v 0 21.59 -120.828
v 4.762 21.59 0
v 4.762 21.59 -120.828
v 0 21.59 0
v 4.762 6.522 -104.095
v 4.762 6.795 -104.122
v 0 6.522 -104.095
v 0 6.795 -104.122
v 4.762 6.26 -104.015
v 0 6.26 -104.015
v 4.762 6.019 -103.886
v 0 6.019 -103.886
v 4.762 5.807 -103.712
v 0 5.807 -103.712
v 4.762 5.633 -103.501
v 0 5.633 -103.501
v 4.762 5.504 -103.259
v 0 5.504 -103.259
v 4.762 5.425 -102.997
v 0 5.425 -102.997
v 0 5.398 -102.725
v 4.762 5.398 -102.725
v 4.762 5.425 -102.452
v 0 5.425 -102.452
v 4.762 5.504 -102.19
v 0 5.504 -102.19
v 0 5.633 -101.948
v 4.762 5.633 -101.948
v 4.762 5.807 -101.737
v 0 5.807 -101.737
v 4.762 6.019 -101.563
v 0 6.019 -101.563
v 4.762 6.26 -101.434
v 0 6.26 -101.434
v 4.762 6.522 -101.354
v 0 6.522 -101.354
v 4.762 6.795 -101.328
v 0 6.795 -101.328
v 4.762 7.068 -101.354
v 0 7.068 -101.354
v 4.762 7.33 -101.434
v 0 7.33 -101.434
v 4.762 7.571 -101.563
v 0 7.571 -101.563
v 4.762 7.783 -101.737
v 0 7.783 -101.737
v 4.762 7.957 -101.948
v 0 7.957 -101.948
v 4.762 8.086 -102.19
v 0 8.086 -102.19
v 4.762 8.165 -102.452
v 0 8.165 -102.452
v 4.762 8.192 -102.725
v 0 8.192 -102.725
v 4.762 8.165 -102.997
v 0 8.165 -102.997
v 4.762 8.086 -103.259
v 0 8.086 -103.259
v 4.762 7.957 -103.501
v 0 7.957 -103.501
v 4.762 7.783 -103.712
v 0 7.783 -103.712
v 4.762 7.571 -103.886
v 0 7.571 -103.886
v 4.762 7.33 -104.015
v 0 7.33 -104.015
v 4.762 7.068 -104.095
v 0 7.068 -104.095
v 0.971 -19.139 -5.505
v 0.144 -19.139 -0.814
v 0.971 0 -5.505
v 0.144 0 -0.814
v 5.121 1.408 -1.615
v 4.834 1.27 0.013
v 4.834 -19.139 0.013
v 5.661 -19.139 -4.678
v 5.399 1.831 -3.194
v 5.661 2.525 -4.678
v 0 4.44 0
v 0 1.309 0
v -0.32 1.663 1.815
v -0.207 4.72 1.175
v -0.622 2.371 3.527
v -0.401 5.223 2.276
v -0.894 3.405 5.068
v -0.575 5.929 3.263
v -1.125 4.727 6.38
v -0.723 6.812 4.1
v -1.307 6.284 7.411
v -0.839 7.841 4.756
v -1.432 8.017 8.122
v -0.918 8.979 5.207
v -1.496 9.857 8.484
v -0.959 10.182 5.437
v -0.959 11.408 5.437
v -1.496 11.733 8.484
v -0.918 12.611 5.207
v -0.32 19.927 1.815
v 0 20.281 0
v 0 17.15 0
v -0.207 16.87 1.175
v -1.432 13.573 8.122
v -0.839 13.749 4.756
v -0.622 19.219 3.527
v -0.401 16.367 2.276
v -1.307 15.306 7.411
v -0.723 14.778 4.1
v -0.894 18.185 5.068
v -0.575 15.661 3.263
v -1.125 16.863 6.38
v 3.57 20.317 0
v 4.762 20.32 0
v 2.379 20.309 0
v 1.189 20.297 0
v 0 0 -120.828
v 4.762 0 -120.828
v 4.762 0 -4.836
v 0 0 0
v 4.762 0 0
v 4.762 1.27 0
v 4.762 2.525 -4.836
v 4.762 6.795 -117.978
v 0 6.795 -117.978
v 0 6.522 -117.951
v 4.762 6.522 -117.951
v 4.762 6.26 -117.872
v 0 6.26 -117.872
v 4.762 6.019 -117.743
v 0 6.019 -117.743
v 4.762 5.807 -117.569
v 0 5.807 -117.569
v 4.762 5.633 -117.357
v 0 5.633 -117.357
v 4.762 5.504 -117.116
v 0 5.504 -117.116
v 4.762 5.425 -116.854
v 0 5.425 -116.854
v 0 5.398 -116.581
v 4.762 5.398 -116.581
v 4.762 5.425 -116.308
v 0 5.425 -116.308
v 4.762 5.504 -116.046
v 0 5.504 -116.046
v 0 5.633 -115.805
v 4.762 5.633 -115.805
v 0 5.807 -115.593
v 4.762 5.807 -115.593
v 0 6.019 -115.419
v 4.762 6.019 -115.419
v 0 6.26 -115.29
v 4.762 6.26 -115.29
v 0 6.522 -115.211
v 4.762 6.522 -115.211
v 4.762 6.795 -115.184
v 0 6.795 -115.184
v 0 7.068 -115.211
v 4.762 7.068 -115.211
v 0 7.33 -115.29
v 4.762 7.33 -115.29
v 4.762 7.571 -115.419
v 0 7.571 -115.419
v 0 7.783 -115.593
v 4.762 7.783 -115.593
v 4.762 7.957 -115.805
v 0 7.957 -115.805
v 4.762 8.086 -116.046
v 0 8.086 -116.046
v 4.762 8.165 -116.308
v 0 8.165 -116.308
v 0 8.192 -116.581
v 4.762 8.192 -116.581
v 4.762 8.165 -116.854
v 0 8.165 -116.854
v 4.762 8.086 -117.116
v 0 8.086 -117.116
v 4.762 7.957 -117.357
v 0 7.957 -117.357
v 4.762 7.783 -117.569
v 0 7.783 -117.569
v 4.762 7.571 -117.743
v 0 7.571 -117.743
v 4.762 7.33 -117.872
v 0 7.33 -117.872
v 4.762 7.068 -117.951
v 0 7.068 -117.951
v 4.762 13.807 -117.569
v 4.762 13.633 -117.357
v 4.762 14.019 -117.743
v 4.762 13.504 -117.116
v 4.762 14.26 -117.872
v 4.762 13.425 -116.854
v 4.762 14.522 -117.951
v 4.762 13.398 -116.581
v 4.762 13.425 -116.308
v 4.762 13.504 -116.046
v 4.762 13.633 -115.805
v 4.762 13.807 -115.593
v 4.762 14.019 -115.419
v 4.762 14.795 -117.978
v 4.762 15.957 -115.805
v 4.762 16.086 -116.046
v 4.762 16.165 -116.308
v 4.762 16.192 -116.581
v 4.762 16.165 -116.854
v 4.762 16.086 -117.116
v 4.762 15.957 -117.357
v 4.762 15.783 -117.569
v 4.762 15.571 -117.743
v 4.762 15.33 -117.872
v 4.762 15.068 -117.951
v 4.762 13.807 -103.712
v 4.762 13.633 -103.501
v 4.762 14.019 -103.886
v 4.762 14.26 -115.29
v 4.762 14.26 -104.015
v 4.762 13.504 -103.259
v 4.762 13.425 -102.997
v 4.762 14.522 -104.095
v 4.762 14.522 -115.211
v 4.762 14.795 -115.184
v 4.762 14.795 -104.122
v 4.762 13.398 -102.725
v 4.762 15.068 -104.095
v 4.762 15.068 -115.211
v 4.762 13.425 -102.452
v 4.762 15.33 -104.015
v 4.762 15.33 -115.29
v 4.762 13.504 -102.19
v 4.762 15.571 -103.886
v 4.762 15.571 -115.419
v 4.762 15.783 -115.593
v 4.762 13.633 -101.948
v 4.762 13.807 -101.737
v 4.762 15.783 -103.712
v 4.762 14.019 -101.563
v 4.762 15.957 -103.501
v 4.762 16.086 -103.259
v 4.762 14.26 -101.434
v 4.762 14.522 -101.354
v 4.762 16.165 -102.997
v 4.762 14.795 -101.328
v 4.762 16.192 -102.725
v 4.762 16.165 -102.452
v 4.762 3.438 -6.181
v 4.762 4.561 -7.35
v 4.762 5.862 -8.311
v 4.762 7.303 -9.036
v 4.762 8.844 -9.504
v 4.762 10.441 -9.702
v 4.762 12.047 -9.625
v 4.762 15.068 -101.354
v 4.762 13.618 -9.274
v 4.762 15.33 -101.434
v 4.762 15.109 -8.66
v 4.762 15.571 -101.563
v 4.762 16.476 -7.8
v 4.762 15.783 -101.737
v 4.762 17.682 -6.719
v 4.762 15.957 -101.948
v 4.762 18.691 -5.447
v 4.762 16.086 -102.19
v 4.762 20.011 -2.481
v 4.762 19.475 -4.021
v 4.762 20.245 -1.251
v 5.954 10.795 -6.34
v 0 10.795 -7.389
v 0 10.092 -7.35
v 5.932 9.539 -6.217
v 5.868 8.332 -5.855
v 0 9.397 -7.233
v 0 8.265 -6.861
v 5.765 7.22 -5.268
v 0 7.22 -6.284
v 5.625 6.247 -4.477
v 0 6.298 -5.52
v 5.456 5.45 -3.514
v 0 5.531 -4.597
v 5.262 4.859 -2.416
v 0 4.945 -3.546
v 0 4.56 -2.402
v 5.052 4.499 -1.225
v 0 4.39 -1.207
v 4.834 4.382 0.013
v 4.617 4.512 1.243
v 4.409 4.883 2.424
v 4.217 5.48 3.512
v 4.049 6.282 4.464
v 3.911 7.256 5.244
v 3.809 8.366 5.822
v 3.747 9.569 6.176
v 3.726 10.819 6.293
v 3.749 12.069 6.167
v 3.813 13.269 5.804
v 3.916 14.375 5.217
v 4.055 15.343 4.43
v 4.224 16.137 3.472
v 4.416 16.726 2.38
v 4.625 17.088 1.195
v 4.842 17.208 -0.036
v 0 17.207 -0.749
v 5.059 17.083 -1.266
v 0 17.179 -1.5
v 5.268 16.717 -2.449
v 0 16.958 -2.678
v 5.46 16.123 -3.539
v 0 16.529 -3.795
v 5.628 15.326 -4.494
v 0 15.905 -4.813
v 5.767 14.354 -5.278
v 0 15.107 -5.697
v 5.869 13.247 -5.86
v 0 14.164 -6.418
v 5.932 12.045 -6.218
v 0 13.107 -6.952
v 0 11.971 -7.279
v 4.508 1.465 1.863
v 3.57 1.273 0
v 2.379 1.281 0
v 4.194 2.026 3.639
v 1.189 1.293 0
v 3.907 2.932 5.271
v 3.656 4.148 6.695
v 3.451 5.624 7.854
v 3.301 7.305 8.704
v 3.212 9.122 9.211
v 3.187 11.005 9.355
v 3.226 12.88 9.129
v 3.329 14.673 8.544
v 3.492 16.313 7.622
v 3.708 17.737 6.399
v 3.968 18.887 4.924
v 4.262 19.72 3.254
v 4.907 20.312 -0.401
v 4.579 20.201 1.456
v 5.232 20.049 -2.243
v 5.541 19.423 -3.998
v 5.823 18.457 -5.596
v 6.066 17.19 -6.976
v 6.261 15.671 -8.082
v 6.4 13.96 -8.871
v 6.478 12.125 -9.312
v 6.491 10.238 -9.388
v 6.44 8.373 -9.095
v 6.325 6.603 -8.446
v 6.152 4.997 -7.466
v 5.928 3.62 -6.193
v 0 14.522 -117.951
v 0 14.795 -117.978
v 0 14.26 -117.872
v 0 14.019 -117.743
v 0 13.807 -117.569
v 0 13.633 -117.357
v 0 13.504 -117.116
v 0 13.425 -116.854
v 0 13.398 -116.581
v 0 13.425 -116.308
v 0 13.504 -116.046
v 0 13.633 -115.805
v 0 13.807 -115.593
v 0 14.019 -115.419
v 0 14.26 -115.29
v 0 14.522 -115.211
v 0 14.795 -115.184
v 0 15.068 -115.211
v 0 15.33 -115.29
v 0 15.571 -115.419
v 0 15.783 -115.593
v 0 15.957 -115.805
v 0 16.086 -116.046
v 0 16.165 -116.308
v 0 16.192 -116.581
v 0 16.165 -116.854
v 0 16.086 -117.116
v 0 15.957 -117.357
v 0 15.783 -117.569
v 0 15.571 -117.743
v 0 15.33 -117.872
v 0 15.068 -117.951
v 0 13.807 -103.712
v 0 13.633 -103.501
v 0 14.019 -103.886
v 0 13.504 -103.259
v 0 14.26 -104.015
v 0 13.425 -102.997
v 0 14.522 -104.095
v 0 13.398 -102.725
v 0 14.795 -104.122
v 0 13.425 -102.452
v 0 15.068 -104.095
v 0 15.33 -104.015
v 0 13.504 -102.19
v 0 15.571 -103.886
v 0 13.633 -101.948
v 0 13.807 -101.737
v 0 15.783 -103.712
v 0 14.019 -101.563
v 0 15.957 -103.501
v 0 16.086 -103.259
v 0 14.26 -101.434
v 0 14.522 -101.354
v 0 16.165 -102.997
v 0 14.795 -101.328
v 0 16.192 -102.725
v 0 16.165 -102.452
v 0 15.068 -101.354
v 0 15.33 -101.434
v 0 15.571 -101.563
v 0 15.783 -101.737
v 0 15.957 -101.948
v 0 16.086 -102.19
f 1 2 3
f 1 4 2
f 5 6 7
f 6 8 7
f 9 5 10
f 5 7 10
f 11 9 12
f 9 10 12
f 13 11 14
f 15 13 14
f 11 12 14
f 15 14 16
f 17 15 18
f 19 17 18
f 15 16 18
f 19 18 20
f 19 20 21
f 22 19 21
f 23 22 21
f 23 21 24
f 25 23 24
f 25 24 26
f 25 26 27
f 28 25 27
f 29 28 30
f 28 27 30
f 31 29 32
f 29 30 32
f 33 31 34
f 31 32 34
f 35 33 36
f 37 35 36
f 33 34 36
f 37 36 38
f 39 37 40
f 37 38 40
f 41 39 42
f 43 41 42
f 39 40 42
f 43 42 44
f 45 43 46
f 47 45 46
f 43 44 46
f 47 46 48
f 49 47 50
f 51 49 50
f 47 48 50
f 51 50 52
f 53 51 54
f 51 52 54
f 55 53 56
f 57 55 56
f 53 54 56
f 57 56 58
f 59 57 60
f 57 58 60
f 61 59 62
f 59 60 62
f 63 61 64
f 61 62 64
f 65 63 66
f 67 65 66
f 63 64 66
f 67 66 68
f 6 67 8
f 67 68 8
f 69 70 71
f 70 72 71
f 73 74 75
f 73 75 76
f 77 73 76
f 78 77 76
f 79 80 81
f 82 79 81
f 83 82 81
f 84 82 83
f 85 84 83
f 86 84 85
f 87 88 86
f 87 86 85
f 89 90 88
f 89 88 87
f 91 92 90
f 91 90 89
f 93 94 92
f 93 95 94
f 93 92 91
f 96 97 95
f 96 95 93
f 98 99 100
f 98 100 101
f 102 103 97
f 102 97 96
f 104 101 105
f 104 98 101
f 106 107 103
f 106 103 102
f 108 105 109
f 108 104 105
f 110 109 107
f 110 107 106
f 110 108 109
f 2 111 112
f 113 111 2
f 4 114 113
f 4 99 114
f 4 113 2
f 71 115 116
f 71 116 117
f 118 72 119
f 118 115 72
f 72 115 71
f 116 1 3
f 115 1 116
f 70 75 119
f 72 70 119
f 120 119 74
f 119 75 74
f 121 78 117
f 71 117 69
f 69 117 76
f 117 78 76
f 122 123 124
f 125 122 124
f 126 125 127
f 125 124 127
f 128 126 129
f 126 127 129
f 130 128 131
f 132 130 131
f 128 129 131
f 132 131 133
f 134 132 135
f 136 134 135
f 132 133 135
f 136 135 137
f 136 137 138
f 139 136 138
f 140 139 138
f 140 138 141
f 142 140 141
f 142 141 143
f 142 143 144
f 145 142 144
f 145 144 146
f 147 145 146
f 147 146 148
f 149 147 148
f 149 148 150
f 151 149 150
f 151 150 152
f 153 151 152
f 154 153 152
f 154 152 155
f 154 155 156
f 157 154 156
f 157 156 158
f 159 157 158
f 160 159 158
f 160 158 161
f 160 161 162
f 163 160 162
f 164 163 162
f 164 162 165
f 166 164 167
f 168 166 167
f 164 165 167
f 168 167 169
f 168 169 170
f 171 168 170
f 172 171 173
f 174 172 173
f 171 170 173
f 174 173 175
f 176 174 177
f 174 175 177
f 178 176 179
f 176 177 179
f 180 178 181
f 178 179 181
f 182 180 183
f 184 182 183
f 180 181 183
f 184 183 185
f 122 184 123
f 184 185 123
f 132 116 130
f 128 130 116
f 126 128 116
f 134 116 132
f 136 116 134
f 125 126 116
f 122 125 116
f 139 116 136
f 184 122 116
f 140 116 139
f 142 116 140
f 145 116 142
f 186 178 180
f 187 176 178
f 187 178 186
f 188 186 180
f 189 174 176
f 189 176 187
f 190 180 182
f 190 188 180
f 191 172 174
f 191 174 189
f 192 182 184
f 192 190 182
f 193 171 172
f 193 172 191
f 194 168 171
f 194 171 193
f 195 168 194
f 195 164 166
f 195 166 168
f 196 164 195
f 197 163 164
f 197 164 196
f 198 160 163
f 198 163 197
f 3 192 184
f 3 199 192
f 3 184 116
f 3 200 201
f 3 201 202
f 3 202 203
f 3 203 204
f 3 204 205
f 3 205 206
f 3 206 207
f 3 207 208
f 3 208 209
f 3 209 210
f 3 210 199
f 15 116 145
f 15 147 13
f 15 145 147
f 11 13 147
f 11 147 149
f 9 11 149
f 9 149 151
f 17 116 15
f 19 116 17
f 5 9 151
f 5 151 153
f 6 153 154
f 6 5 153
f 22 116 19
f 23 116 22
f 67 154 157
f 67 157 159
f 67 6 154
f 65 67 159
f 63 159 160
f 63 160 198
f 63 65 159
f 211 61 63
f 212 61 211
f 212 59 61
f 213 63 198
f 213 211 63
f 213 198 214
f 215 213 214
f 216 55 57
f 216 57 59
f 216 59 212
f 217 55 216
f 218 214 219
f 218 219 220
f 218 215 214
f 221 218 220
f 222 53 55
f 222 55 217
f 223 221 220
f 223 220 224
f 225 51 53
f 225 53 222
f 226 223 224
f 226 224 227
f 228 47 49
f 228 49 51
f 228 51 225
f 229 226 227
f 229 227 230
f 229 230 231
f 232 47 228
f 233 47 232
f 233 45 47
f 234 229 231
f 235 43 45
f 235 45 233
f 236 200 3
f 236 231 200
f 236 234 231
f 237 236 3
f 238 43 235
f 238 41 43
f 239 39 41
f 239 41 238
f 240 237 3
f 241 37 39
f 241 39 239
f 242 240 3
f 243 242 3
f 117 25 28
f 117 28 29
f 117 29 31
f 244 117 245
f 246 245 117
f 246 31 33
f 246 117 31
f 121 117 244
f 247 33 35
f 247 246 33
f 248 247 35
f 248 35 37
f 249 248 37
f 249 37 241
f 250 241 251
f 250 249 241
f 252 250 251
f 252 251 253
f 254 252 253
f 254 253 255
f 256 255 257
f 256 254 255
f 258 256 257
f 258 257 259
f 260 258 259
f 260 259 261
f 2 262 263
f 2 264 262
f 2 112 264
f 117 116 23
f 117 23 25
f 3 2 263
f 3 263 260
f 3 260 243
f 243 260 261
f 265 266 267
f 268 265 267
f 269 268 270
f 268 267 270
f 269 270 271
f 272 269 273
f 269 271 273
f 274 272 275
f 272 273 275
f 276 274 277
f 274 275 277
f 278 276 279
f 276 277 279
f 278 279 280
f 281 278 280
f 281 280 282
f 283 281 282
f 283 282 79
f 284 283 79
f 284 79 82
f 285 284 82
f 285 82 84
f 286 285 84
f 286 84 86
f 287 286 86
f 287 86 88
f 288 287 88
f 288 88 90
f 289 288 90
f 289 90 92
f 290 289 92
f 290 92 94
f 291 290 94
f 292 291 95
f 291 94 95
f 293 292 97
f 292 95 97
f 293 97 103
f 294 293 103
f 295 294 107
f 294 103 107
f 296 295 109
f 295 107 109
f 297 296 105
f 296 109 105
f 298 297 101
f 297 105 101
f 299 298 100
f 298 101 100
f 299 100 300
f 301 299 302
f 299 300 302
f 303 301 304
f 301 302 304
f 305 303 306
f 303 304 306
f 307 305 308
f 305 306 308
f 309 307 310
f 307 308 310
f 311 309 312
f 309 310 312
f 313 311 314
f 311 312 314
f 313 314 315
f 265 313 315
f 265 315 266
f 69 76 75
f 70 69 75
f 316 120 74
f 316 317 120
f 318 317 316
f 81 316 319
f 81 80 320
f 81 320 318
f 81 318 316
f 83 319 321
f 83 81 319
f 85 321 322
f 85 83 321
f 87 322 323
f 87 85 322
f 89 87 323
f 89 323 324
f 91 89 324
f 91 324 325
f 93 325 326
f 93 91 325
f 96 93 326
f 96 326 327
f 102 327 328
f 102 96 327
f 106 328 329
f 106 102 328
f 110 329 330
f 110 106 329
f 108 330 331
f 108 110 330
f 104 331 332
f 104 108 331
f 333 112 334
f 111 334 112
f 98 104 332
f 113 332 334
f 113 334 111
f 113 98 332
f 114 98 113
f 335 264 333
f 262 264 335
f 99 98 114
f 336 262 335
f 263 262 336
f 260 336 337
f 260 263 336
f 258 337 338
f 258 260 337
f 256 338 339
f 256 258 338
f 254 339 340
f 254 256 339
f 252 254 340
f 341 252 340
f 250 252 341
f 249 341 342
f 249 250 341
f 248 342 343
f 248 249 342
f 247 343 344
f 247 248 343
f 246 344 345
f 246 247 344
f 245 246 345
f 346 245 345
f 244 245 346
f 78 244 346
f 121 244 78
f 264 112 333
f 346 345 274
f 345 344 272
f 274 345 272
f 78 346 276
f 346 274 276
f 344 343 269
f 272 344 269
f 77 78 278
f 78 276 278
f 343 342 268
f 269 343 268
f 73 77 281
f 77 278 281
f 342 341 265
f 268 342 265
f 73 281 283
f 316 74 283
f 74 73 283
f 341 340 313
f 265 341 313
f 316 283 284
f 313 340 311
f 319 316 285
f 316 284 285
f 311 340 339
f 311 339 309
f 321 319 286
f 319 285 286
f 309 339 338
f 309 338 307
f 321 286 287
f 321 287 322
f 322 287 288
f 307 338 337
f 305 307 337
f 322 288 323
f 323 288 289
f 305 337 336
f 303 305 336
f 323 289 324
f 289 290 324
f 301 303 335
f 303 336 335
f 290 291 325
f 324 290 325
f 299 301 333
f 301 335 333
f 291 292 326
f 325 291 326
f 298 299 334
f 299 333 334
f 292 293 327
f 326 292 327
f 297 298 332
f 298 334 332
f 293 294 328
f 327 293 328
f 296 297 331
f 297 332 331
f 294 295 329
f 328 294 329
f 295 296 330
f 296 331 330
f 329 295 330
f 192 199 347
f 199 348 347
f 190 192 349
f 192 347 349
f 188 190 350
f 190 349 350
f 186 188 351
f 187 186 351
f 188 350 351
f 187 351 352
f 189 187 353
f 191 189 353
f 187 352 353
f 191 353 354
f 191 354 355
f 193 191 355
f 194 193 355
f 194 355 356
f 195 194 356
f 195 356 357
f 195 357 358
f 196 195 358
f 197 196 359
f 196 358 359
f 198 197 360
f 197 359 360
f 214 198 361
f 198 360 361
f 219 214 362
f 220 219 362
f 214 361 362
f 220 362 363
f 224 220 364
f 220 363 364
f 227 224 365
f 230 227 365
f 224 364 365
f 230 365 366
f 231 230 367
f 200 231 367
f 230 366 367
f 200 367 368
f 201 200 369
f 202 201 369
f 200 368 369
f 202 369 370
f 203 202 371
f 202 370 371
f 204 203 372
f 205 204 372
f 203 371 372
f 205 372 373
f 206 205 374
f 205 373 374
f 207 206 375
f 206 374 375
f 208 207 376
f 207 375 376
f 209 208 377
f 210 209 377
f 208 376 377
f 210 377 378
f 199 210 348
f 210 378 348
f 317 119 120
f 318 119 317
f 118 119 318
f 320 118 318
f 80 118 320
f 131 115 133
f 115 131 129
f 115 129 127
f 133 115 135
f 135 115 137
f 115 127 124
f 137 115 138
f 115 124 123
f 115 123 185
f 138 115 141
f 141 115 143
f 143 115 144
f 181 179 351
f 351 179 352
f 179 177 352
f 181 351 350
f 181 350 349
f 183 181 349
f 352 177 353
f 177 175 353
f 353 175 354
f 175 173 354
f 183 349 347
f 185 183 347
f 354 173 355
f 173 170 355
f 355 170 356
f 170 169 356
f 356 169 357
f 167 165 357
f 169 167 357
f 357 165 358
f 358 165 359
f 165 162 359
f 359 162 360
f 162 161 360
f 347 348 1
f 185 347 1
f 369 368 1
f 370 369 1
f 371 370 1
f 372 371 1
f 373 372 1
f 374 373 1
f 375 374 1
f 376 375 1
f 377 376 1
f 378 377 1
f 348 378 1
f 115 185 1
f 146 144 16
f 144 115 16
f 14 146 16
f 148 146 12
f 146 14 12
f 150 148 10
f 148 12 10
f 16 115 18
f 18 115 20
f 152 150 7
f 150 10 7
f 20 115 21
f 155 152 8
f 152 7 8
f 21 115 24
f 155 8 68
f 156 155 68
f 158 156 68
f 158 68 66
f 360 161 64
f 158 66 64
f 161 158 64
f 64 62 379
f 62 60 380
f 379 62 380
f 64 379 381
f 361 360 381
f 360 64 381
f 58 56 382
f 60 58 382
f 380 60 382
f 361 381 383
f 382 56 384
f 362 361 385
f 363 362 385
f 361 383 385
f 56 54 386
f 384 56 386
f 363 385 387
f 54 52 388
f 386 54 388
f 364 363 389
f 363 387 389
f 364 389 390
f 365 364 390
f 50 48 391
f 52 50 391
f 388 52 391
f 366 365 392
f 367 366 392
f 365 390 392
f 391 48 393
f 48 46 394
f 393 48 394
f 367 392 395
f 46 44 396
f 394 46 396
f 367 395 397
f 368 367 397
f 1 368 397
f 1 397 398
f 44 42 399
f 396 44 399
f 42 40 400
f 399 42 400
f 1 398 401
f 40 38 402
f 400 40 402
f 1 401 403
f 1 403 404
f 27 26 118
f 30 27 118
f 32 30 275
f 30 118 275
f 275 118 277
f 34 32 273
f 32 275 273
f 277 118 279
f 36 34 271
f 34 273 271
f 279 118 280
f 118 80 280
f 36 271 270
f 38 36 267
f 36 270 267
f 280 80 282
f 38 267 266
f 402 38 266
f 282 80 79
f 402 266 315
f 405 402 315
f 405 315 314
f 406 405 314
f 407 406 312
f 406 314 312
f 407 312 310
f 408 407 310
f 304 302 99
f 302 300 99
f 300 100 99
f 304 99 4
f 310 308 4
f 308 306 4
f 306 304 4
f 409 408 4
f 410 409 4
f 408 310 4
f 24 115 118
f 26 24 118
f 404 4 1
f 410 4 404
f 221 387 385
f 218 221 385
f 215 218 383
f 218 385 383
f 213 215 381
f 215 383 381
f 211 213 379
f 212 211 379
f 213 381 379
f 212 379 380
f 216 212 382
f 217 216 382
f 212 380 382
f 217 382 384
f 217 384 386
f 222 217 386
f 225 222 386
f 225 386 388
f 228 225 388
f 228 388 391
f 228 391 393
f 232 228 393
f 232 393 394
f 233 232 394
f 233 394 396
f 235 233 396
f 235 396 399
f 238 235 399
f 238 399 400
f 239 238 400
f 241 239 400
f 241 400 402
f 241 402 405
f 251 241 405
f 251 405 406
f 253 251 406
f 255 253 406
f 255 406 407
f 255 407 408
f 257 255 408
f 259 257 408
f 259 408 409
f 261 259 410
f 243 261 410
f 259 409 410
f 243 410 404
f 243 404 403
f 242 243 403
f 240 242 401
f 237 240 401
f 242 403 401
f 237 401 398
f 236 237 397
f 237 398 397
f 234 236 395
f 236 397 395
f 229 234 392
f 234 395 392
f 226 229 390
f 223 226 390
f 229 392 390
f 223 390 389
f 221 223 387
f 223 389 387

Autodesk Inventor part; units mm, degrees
ref_plane "YZ Plane" through (0, 0, 0) normal (1, 0, 0) x (0, 1, 0)
ref_plane "XZ Plane" through (0, 0, 0) normal (0, 1, 0) x (-1, 0, 0)
ref_plane "XY Plane" through (0, 0, 0) normal (0, 0, 1) x (1, 0, 0)
sketch "Sketch1" plane through (0, 0, 0) normal (1, 0, 0) x (0, 1, 0)
  line L0 (0, 0) -> (21.59, 0)
  line L1 (21.59, 0) -> (21.59, -120.8278)
  line L2 (21.59, -120.8278) -> (0, -120.8278)
  line L3 (0, -120.8278) -> (0, 0)
  dimension "d0" = 21.59
  dimension "d1" = 120.8278
extrude "Extrusion1" add sketch "Sketch1" along normal blind 4.7625
sketch "Sketch2" plane through (0, 21.59, 0) normal (0, 1, 0) x (1, 0, 0)
  line L0 (0, 0) -> (-3.2071, -18.1884)
  line L1 (0, 0) -> (18.469, 0) construction
  line L2 (0, 0) -> (13.0579, -2.3025)
  line L3 (0, 0) -> (13.2594, 0) construction
  dimension "d4" = 100
  dimension "d24" = 10
ref_plane "Work Plane1" through (0, 21.59, 0) normal (-0.9848078, 0, -0.1736482) x (-0.1736482, 0, 0.9848078)
sketch "Sketch3" plane through (0, 21.59, 0) normal (-0.9848078, 0, -0.1736482) x (-0.1736482, 0, 0.9848078)
  line L0 (-0.827, 0) -> (-0.827, -21.59) projected
  line L1 (-0.827, -21.59) -> (-119.8192, -21.59) projected
  line L2 (-119.8192, -21.59) -> (-119.8192, 0) projected
  line L3 (-119.8192, 0) -> (-0.827, 0) projected
  line L4 (0, -21.59) -> (0, 0) projected
  line L5 (0, -21.59) -> (-0.827, -21.59) projected
  line L6 (-0.827, 0) -> (-0.827, -21.59) projected
  line L7 (0, 0) -> (-0.827, 0) projected
  line L8 (0, -21.59) -> (0, 0) projected
  circle A0 centre (-0.8636, -10.795) radius 9.525
  dimension "d6" = 21.59
  dimension "d50" = 19.05
  dimension "d51" = 0.8636
extrude "Extrusion2" add sketch "Sketch3" against normal blind 4.7625 contours A0 L4 L0 | L0 A0 | A0 L4
ref_plane "Work Plane3" through (0, 0, 0) normal (-0.1736482, 0, 0.9848078) x (0, 1, 0)
sketch "Sketch9" plane through (4.7625, 0, 0) normal (1, 0, 0) x (0, 0, -1)
  line L0 (0, 21.59) -> (0, 20.3199) projected
  line L1 (0, 0) -> (120.8278, 0) projected
  line L2 (120.8278, 0) -> (120.8278, 21.59) projected
  line L3 (120.8278, 21.59) -> (0, 21.59) projected
  circle A0 centre (109.6528, 10.795) radius 8
  line L4 (102.7246, 14.795) -> (116.581, 14.795)
  line L5 (116.581, 14.795) -> (116.581, 6.795)
  line L6 (116.581, 6.795) -> (102.7246, 6.795)
  line L7 (102.7246, 6.795) -> (102.7246, 14.795)
  ellipse E0 centre (0.0372, 10.795) end of major axis (9.7091, 10.795) minor radius 9.525 (0, 1.2701) -> (0, 20.3199) ccw projected
  line L8 (0, 1.2701) -> (0, 0) projected
  dimension "d34" = 16
  dimension "d35" = 8
  dimension "d36" = 4
  dimension "d37" = 21.59
  dimension "d38" = 10.795
  dimension "d39" = 11.175
hole "Hole3" at (4.7625, 14.795, -102.7246) at (4.7625, 6.795, -102.7246) at (4.7625, 14.795, -116.581) at (4.7625, 6.795, -116.581) direction (-1, 0, 0) diameter 2.794 end through all
sketch "Sketch11" plane through (4.8401, 10.795, -0.0235) normal (0.9848078, 0, 0.1736482) x (0.1736482, 0, -0.9848078)
  circle A0 centre (0, 0) radius 9.525 projected
  point P0 (-0.8636, -10.795)
hole "Hole4" at (4.8401, 10.795, -0.0235) direction (-0.9848078, 0, -0.1736482) diameter 12.827 end through all
sketch "Sketch12" plane through (4.8401, 10.795, -0.0235) normal (0.9848078, 0, 0.1736482) x (0.1736482, 0, -0.9848078)
  circle A0 centre (0, 0) radius 6.4135 projected
  circle A1 centre (0, 0) radius 9.525 projected
  ellipse E0 centre (114.7733, 4) end of major axis (114.7733, 2.603) minor radius 1.3758 projected
  ellipse E1 centre (101.1274, 4) end of major axis (101.1274, 2.603) minor radius 1.3758 projected
  ellipse E2 centre (101.1274, -4) end of major axis (101.1274, -5.397) minor radius 1.3758 projected
  ellipse E3 centre (114.7733, -4) end of major axis (114.7733, -5.397) minor radius 1.3758 projected
  arc A2 (-0.0366, -9.5249) -> (-0.0366, 9.5249) centre (0, 0) ccw projected
  line L0 (-0.0366, -9.5249) -> (-0.0366, -10.795) projected
  line L1 (-0.0366, -10.795) -> (118.9556, -10.795) projected
  line L2 (118.9556, -10.795) -> (118.9556, 10.795) projected
  line L3 (118.9556, 10.795) -> (-0.0366, 10.795) projected
  line L4 (-0.0366, 10.795) -> (-0.0366, 9.5249) projected
  line L5 (-0.0366, -6.4134) -> (4.7259, -6.4134)
  line L6 (4.7259, -6.4134) -> (4.7259, -29.9338)
  line L7 (4.7259, -29.9338) -> (-0.0366, -29.9338)
  line L8 (-0.0366, -29.9338) -> (-0.0366, -6.4134)
  point P0 (-0.8636, -10.795)
  dimension "d59" = 4.7625
  dimension "d60" = 23.5204
extrude "Extrusion5" add sketch "Sketch12" against normal blind 4.7625 contours L5 L6 A1 L8 | A1 L6 L1 L0 | L1 L6 L7 L8 picked at (2.6364, -7.2637)
equation "\"d36\" = 0.5 * d35"
equation "\"d38\" = 0.5 * d37"
properties part number "WheelIntakeMotorMount2.0"
